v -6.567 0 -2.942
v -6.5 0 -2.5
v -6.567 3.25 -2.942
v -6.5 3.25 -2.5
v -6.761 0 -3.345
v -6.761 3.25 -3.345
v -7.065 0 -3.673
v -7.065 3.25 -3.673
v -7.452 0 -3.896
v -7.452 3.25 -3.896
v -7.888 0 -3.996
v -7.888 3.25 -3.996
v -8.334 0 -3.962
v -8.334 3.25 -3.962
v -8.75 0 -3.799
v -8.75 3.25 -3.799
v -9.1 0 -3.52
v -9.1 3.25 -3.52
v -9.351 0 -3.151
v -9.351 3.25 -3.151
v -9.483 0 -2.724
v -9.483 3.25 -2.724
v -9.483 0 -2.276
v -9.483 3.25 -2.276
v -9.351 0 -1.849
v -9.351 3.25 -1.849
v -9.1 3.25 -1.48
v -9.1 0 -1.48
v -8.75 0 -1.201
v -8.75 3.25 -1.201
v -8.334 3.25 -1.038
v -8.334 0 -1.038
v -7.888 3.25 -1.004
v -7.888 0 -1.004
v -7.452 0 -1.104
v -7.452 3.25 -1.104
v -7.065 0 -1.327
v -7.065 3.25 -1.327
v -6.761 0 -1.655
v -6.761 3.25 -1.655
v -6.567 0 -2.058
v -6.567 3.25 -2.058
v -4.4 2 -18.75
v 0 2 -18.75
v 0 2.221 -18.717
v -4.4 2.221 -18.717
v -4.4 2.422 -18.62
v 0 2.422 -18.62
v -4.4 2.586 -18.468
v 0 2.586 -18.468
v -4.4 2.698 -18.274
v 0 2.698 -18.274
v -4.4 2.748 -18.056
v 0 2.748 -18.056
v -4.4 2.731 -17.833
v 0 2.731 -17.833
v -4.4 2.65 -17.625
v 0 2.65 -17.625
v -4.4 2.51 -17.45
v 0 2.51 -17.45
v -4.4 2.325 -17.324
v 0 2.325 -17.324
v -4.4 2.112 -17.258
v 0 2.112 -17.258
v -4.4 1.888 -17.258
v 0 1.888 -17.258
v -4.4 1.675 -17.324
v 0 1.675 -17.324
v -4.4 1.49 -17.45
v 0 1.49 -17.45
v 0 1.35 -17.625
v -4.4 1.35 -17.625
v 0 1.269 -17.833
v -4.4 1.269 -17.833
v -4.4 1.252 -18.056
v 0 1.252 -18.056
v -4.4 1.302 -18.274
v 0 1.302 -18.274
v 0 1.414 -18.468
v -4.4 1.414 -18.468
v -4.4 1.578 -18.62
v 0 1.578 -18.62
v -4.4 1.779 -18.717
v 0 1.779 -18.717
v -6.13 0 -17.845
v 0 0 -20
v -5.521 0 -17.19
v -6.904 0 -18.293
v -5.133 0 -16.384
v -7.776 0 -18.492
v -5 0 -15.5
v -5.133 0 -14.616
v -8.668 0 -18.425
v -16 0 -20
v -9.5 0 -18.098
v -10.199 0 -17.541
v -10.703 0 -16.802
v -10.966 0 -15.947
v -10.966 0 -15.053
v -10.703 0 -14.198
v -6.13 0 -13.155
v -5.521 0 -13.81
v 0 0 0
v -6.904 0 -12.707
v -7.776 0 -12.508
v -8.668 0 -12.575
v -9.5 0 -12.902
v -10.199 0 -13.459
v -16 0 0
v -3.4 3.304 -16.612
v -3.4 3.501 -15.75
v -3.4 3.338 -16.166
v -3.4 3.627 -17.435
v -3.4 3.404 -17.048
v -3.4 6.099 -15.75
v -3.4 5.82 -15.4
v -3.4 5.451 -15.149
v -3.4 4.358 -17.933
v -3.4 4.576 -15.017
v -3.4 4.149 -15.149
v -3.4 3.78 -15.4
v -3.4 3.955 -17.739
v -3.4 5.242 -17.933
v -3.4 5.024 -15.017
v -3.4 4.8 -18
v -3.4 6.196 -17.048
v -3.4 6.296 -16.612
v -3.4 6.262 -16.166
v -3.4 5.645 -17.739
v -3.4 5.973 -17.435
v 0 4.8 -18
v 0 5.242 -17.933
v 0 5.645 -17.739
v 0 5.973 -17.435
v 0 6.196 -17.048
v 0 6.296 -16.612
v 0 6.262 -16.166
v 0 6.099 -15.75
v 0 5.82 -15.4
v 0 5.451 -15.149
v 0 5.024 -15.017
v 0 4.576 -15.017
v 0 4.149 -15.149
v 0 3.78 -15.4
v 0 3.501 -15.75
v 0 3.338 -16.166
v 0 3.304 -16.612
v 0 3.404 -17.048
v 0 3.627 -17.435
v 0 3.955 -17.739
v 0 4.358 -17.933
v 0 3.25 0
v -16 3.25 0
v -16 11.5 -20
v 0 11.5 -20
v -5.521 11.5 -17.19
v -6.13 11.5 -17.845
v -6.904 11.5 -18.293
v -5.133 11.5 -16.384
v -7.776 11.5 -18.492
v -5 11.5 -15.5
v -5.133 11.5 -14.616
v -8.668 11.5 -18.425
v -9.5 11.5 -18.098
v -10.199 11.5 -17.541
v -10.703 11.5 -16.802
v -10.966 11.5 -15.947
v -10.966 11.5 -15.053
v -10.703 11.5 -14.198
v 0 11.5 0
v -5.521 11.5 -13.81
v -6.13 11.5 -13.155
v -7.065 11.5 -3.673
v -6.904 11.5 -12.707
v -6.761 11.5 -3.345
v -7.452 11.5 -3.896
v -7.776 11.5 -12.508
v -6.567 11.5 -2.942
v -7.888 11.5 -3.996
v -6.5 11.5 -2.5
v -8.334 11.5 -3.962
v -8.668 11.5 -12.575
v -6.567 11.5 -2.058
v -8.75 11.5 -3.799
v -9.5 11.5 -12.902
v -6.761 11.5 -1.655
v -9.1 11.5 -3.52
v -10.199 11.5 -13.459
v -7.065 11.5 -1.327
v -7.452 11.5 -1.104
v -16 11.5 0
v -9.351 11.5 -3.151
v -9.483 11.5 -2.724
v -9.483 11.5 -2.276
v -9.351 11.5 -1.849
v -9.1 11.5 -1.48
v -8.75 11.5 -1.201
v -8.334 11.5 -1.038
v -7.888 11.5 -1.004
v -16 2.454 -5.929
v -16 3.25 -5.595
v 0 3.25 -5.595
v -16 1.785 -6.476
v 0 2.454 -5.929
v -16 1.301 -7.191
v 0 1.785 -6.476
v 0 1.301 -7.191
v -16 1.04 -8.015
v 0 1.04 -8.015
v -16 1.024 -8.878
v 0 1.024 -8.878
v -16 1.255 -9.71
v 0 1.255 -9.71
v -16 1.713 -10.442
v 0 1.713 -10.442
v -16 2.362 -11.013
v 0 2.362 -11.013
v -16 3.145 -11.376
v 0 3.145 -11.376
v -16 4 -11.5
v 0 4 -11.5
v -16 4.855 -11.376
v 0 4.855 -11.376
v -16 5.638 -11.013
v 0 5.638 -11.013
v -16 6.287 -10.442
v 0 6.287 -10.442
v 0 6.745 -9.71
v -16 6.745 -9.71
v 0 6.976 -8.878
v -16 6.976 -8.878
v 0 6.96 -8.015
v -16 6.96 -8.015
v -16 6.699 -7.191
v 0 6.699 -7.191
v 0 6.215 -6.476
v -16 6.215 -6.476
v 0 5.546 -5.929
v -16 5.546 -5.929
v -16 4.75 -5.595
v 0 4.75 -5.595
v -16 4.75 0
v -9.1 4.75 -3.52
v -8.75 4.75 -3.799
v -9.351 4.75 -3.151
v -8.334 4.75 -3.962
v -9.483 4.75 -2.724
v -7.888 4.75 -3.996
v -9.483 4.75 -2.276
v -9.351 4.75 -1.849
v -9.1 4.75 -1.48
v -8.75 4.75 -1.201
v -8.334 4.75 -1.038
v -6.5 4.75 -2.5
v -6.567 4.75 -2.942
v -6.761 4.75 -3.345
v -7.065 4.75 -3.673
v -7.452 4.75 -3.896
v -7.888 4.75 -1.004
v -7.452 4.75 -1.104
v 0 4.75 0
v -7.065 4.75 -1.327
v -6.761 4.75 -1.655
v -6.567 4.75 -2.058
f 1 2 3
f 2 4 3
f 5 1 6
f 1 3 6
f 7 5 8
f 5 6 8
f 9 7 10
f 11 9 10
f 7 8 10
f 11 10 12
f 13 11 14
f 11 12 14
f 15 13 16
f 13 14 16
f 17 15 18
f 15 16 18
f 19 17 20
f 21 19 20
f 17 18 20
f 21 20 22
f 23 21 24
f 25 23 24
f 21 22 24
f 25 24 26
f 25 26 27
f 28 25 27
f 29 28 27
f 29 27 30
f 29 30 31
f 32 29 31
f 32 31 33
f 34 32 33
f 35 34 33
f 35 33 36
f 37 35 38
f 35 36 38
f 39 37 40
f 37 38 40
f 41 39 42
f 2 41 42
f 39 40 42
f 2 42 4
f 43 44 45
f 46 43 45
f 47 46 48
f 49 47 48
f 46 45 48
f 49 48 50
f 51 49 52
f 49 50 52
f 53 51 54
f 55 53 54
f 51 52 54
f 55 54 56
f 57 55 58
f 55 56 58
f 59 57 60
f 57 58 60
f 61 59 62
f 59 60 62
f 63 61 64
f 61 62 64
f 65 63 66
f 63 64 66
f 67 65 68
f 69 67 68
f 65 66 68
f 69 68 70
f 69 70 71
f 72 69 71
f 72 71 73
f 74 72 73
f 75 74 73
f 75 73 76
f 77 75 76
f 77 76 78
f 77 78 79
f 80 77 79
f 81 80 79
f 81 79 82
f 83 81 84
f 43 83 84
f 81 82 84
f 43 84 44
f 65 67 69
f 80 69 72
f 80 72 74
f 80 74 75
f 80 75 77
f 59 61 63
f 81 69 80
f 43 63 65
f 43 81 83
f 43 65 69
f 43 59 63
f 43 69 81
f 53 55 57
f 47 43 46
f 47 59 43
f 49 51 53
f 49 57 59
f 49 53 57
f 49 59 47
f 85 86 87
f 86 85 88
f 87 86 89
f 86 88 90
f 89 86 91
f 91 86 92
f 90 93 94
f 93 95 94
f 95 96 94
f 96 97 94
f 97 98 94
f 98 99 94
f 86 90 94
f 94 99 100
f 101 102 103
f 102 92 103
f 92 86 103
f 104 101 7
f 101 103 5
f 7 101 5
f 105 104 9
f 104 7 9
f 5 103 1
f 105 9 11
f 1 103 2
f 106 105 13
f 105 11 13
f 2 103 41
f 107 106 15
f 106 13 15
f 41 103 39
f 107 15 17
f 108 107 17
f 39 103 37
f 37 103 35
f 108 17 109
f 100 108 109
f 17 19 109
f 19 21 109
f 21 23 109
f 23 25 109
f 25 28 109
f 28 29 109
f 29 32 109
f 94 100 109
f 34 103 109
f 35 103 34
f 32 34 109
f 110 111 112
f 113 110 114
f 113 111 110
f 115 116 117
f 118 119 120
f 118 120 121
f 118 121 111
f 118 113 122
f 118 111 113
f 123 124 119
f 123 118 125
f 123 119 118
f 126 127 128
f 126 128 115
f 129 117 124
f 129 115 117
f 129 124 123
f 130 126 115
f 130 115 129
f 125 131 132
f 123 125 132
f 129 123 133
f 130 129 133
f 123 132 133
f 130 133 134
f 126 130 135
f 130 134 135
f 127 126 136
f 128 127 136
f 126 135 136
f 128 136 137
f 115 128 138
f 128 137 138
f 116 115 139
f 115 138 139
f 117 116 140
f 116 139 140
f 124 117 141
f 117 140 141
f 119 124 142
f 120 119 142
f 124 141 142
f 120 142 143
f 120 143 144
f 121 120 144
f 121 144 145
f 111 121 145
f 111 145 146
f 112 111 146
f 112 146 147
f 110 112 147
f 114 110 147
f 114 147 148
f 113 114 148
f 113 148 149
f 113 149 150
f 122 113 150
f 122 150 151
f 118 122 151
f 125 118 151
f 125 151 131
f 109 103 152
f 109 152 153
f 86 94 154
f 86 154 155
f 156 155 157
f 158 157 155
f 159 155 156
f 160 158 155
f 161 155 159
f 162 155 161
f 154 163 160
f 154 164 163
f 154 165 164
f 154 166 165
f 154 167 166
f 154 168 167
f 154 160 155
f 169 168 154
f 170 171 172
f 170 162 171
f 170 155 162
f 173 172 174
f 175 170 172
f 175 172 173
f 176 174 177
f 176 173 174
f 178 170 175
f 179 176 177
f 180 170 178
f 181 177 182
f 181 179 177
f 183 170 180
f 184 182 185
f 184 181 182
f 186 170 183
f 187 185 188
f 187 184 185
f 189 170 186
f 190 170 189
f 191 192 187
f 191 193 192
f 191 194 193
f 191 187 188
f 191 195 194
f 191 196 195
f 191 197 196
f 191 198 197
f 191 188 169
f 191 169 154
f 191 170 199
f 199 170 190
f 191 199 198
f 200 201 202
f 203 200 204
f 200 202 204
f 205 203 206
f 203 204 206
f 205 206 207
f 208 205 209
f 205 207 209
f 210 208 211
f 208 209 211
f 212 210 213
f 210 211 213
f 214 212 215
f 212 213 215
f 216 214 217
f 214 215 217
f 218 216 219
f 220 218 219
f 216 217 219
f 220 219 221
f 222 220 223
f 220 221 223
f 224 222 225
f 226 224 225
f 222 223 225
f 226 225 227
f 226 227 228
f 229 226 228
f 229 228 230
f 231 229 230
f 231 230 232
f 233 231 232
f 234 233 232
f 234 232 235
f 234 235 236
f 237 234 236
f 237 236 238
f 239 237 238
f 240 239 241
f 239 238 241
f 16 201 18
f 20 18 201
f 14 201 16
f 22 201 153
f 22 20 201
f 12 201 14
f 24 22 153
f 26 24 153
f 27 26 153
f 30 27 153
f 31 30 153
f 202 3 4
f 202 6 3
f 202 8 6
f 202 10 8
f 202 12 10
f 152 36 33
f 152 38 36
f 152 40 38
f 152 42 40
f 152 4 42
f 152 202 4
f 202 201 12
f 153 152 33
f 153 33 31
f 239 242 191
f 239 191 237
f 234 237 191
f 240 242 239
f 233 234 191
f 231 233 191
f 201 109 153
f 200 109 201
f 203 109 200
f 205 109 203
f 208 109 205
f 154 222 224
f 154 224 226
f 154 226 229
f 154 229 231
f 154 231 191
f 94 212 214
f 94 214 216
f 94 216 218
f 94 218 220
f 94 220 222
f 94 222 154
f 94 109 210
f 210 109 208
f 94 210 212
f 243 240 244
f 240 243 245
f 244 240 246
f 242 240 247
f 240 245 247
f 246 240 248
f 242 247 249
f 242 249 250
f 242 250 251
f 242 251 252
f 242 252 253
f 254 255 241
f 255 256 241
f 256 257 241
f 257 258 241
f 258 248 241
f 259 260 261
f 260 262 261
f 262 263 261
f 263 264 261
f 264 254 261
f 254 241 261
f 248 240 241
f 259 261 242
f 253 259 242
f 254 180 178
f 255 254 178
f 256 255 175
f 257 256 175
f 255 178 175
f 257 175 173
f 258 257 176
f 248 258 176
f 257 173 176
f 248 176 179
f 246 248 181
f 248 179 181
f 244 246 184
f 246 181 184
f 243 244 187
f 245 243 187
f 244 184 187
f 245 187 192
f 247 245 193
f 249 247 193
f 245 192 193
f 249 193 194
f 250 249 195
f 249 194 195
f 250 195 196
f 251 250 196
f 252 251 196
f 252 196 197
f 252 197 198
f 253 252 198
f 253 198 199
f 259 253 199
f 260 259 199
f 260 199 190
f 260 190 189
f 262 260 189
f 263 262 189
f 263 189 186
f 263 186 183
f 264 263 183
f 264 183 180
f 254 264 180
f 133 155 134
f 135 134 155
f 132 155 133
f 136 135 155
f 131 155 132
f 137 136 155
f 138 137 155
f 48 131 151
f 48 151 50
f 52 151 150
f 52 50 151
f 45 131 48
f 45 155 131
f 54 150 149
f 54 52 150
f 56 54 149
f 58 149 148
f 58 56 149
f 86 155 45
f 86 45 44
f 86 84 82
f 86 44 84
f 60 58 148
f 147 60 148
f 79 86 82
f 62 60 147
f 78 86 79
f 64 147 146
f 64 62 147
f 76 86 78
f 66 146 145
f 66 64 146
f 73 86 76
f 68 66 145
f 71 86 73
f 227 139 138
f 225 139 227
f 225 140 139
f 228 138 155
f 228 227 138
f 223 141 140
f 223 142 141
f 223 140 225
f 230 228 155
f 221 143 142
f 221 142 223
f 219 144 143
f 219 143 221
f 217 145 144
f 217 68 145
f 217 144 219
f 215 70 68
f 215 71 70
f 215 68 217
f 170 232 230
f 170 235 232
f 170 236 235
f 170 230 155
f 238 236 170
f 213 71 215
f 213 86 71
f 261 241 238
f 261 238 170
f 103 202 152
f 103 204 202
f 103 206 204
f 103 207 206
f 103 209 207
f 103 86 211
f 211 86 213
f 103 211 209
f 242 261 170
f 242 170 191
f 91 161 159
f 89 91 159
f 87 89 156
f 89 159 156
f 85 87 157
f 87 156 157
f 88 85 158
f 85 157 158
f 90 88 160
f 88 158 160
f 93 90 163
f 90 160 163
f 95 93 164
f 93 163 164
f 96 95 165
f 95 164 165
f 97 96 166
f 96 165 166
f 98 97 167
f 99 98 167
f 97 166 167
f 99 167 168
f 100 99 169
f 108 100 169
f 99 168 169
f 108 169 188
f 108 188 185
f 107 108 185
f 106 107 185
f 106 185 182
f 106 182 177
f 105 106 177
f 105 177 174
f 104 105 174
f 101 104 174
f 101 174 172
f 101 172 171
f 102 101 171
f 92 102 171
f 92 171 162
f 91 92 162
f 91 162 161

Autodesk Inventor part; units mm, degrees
ref_plane "YZ Plane" through (0, 0, 0) normal (1, 0, 0) x (0, 1, 0)
ref_plane "XZ Plane" through (0, 0, 0) normal (0, 1, 0) x (-1, 0, 0)
ref_plane "XY Plane" through (0, 0, 0) normal (0, 0, 1) x (1, 0, 0)
sketch "Sketch1" plane through (0, 0, 0) normal (0, 1, 0) x (-1, 0, 0)
  line L0 (0, 0) -> (16, 0)
  line L1 (16, 0) -> (16, -20)
  line L2 (16, -20) -> (0, -20)
  line L3 (0, -20) -> (0, 0)
  dimension "d0" = 16
  dimension "d1" = 20
extrude "Extrusion1" add sketch "Sketch1" along normal blind 11.5
sketch "Sketch2" plane through (0, 11.5, 0) normal (0, 1, 0) x (1, 0, 0)
  line L0 (0, 0) -> (0, 20) projected
  line L1 (0, 20) -> (-16, 20) projected
  circle A0 centre (-8, 15.5) radius 3
  dimension "d4" = 6
  dimension "d5" = 8
  dimension "d6" = 4.5
extrude "Extrusion2" cut sketch "Sketch2" against normal up to surface (11.5 mm away)
sketch "Sketch3" plane through (0, 11.5, 0) normal (0, 1, 0) x (1, 0, 0)
  line L0 (0, 0) -> (0, 20) projected
  line L1 (0, 20) -> (-16, 20) projected
  circle A0 centre (-8, 2.5) radius 1.5
  dimension "d9" = 3
  dimension "d11" = 17.5
  dimension "d12" = 8
extrude "Extrusion3" cut sketch "Sketch3" against normal up to surface (11.5 mm away)
sketch "Sketch4" plane through (0, 0, 0) normal (1, 0, 0) x (0, 0, -1)
  line L0 (20, 0) -> (0, 0) projected
  line L1 (20, 0) -> (20, 11.5) projected
  line L2 (0, 0) -> (0, 11.5) projected
  arc A0 (5.5953, 3.25) -> (5.5953, 4.75) centre (8.5, 4) ccw
  line L3 (5.5953, 4.75) -> (0, 4.75)
  line L4 (5.5953, 3.25) -> (0, 3.25)
  dimension "d15" = 6
  dimension "d16" = 11.5
  dimension "d17" = 4
  dimension "d18" = 1.5
  dimension "d19" = 0.75
extrude "Extrusion4" cut sketch "Sketch4" against normal up to surface (16 mm away)
sketch "Sketch5" plane through (0, 0, 0) normal (1, 0, 0) x (0, 0, -1)
  line L0 (20, 0) -> (0, 0) projected
  line L1 (20, 0) -> (20, 11.5) projected
  circle A0 centre (18, 2) radius 0.75
  dimension "d22" = 1.5
  dimension "d24" = 2
  dimension "d25" = 2
extrude "Extrusion5" cut sketch "Sketch5" against normal blind 4.4
sketch "Sketch6" plane through (0, 0, 0) normal (1, 0, 0) x (0, 0, -1)
  line L0 (20, 0) -> (0, 0) projected
  line L1 (20, 0) -> (20, 11.5) projected
  circle A0 centre (16.5, 4.8) radius 1.5
  dimension "d28" = 3
  dimension "d29" = 4.8
  dimension "d30" = 3.5
extrude "Extrusion6" cut sketch "Sketch6" against normal blind 3.4
thread "Thread1" size "M3x0.5" class "6H" standard "ANSI Metric M Profile" full length
thread "Thread2" size "M6x1" class "6H" standard "ANSI Metric M Profile" full length
thread "Thread3" size "M3x0.5" class "6H" standard "ANSI Metric M Profile" full length
properties part number "E3DV6NozzleBlock" material "Aluminum 6061"
